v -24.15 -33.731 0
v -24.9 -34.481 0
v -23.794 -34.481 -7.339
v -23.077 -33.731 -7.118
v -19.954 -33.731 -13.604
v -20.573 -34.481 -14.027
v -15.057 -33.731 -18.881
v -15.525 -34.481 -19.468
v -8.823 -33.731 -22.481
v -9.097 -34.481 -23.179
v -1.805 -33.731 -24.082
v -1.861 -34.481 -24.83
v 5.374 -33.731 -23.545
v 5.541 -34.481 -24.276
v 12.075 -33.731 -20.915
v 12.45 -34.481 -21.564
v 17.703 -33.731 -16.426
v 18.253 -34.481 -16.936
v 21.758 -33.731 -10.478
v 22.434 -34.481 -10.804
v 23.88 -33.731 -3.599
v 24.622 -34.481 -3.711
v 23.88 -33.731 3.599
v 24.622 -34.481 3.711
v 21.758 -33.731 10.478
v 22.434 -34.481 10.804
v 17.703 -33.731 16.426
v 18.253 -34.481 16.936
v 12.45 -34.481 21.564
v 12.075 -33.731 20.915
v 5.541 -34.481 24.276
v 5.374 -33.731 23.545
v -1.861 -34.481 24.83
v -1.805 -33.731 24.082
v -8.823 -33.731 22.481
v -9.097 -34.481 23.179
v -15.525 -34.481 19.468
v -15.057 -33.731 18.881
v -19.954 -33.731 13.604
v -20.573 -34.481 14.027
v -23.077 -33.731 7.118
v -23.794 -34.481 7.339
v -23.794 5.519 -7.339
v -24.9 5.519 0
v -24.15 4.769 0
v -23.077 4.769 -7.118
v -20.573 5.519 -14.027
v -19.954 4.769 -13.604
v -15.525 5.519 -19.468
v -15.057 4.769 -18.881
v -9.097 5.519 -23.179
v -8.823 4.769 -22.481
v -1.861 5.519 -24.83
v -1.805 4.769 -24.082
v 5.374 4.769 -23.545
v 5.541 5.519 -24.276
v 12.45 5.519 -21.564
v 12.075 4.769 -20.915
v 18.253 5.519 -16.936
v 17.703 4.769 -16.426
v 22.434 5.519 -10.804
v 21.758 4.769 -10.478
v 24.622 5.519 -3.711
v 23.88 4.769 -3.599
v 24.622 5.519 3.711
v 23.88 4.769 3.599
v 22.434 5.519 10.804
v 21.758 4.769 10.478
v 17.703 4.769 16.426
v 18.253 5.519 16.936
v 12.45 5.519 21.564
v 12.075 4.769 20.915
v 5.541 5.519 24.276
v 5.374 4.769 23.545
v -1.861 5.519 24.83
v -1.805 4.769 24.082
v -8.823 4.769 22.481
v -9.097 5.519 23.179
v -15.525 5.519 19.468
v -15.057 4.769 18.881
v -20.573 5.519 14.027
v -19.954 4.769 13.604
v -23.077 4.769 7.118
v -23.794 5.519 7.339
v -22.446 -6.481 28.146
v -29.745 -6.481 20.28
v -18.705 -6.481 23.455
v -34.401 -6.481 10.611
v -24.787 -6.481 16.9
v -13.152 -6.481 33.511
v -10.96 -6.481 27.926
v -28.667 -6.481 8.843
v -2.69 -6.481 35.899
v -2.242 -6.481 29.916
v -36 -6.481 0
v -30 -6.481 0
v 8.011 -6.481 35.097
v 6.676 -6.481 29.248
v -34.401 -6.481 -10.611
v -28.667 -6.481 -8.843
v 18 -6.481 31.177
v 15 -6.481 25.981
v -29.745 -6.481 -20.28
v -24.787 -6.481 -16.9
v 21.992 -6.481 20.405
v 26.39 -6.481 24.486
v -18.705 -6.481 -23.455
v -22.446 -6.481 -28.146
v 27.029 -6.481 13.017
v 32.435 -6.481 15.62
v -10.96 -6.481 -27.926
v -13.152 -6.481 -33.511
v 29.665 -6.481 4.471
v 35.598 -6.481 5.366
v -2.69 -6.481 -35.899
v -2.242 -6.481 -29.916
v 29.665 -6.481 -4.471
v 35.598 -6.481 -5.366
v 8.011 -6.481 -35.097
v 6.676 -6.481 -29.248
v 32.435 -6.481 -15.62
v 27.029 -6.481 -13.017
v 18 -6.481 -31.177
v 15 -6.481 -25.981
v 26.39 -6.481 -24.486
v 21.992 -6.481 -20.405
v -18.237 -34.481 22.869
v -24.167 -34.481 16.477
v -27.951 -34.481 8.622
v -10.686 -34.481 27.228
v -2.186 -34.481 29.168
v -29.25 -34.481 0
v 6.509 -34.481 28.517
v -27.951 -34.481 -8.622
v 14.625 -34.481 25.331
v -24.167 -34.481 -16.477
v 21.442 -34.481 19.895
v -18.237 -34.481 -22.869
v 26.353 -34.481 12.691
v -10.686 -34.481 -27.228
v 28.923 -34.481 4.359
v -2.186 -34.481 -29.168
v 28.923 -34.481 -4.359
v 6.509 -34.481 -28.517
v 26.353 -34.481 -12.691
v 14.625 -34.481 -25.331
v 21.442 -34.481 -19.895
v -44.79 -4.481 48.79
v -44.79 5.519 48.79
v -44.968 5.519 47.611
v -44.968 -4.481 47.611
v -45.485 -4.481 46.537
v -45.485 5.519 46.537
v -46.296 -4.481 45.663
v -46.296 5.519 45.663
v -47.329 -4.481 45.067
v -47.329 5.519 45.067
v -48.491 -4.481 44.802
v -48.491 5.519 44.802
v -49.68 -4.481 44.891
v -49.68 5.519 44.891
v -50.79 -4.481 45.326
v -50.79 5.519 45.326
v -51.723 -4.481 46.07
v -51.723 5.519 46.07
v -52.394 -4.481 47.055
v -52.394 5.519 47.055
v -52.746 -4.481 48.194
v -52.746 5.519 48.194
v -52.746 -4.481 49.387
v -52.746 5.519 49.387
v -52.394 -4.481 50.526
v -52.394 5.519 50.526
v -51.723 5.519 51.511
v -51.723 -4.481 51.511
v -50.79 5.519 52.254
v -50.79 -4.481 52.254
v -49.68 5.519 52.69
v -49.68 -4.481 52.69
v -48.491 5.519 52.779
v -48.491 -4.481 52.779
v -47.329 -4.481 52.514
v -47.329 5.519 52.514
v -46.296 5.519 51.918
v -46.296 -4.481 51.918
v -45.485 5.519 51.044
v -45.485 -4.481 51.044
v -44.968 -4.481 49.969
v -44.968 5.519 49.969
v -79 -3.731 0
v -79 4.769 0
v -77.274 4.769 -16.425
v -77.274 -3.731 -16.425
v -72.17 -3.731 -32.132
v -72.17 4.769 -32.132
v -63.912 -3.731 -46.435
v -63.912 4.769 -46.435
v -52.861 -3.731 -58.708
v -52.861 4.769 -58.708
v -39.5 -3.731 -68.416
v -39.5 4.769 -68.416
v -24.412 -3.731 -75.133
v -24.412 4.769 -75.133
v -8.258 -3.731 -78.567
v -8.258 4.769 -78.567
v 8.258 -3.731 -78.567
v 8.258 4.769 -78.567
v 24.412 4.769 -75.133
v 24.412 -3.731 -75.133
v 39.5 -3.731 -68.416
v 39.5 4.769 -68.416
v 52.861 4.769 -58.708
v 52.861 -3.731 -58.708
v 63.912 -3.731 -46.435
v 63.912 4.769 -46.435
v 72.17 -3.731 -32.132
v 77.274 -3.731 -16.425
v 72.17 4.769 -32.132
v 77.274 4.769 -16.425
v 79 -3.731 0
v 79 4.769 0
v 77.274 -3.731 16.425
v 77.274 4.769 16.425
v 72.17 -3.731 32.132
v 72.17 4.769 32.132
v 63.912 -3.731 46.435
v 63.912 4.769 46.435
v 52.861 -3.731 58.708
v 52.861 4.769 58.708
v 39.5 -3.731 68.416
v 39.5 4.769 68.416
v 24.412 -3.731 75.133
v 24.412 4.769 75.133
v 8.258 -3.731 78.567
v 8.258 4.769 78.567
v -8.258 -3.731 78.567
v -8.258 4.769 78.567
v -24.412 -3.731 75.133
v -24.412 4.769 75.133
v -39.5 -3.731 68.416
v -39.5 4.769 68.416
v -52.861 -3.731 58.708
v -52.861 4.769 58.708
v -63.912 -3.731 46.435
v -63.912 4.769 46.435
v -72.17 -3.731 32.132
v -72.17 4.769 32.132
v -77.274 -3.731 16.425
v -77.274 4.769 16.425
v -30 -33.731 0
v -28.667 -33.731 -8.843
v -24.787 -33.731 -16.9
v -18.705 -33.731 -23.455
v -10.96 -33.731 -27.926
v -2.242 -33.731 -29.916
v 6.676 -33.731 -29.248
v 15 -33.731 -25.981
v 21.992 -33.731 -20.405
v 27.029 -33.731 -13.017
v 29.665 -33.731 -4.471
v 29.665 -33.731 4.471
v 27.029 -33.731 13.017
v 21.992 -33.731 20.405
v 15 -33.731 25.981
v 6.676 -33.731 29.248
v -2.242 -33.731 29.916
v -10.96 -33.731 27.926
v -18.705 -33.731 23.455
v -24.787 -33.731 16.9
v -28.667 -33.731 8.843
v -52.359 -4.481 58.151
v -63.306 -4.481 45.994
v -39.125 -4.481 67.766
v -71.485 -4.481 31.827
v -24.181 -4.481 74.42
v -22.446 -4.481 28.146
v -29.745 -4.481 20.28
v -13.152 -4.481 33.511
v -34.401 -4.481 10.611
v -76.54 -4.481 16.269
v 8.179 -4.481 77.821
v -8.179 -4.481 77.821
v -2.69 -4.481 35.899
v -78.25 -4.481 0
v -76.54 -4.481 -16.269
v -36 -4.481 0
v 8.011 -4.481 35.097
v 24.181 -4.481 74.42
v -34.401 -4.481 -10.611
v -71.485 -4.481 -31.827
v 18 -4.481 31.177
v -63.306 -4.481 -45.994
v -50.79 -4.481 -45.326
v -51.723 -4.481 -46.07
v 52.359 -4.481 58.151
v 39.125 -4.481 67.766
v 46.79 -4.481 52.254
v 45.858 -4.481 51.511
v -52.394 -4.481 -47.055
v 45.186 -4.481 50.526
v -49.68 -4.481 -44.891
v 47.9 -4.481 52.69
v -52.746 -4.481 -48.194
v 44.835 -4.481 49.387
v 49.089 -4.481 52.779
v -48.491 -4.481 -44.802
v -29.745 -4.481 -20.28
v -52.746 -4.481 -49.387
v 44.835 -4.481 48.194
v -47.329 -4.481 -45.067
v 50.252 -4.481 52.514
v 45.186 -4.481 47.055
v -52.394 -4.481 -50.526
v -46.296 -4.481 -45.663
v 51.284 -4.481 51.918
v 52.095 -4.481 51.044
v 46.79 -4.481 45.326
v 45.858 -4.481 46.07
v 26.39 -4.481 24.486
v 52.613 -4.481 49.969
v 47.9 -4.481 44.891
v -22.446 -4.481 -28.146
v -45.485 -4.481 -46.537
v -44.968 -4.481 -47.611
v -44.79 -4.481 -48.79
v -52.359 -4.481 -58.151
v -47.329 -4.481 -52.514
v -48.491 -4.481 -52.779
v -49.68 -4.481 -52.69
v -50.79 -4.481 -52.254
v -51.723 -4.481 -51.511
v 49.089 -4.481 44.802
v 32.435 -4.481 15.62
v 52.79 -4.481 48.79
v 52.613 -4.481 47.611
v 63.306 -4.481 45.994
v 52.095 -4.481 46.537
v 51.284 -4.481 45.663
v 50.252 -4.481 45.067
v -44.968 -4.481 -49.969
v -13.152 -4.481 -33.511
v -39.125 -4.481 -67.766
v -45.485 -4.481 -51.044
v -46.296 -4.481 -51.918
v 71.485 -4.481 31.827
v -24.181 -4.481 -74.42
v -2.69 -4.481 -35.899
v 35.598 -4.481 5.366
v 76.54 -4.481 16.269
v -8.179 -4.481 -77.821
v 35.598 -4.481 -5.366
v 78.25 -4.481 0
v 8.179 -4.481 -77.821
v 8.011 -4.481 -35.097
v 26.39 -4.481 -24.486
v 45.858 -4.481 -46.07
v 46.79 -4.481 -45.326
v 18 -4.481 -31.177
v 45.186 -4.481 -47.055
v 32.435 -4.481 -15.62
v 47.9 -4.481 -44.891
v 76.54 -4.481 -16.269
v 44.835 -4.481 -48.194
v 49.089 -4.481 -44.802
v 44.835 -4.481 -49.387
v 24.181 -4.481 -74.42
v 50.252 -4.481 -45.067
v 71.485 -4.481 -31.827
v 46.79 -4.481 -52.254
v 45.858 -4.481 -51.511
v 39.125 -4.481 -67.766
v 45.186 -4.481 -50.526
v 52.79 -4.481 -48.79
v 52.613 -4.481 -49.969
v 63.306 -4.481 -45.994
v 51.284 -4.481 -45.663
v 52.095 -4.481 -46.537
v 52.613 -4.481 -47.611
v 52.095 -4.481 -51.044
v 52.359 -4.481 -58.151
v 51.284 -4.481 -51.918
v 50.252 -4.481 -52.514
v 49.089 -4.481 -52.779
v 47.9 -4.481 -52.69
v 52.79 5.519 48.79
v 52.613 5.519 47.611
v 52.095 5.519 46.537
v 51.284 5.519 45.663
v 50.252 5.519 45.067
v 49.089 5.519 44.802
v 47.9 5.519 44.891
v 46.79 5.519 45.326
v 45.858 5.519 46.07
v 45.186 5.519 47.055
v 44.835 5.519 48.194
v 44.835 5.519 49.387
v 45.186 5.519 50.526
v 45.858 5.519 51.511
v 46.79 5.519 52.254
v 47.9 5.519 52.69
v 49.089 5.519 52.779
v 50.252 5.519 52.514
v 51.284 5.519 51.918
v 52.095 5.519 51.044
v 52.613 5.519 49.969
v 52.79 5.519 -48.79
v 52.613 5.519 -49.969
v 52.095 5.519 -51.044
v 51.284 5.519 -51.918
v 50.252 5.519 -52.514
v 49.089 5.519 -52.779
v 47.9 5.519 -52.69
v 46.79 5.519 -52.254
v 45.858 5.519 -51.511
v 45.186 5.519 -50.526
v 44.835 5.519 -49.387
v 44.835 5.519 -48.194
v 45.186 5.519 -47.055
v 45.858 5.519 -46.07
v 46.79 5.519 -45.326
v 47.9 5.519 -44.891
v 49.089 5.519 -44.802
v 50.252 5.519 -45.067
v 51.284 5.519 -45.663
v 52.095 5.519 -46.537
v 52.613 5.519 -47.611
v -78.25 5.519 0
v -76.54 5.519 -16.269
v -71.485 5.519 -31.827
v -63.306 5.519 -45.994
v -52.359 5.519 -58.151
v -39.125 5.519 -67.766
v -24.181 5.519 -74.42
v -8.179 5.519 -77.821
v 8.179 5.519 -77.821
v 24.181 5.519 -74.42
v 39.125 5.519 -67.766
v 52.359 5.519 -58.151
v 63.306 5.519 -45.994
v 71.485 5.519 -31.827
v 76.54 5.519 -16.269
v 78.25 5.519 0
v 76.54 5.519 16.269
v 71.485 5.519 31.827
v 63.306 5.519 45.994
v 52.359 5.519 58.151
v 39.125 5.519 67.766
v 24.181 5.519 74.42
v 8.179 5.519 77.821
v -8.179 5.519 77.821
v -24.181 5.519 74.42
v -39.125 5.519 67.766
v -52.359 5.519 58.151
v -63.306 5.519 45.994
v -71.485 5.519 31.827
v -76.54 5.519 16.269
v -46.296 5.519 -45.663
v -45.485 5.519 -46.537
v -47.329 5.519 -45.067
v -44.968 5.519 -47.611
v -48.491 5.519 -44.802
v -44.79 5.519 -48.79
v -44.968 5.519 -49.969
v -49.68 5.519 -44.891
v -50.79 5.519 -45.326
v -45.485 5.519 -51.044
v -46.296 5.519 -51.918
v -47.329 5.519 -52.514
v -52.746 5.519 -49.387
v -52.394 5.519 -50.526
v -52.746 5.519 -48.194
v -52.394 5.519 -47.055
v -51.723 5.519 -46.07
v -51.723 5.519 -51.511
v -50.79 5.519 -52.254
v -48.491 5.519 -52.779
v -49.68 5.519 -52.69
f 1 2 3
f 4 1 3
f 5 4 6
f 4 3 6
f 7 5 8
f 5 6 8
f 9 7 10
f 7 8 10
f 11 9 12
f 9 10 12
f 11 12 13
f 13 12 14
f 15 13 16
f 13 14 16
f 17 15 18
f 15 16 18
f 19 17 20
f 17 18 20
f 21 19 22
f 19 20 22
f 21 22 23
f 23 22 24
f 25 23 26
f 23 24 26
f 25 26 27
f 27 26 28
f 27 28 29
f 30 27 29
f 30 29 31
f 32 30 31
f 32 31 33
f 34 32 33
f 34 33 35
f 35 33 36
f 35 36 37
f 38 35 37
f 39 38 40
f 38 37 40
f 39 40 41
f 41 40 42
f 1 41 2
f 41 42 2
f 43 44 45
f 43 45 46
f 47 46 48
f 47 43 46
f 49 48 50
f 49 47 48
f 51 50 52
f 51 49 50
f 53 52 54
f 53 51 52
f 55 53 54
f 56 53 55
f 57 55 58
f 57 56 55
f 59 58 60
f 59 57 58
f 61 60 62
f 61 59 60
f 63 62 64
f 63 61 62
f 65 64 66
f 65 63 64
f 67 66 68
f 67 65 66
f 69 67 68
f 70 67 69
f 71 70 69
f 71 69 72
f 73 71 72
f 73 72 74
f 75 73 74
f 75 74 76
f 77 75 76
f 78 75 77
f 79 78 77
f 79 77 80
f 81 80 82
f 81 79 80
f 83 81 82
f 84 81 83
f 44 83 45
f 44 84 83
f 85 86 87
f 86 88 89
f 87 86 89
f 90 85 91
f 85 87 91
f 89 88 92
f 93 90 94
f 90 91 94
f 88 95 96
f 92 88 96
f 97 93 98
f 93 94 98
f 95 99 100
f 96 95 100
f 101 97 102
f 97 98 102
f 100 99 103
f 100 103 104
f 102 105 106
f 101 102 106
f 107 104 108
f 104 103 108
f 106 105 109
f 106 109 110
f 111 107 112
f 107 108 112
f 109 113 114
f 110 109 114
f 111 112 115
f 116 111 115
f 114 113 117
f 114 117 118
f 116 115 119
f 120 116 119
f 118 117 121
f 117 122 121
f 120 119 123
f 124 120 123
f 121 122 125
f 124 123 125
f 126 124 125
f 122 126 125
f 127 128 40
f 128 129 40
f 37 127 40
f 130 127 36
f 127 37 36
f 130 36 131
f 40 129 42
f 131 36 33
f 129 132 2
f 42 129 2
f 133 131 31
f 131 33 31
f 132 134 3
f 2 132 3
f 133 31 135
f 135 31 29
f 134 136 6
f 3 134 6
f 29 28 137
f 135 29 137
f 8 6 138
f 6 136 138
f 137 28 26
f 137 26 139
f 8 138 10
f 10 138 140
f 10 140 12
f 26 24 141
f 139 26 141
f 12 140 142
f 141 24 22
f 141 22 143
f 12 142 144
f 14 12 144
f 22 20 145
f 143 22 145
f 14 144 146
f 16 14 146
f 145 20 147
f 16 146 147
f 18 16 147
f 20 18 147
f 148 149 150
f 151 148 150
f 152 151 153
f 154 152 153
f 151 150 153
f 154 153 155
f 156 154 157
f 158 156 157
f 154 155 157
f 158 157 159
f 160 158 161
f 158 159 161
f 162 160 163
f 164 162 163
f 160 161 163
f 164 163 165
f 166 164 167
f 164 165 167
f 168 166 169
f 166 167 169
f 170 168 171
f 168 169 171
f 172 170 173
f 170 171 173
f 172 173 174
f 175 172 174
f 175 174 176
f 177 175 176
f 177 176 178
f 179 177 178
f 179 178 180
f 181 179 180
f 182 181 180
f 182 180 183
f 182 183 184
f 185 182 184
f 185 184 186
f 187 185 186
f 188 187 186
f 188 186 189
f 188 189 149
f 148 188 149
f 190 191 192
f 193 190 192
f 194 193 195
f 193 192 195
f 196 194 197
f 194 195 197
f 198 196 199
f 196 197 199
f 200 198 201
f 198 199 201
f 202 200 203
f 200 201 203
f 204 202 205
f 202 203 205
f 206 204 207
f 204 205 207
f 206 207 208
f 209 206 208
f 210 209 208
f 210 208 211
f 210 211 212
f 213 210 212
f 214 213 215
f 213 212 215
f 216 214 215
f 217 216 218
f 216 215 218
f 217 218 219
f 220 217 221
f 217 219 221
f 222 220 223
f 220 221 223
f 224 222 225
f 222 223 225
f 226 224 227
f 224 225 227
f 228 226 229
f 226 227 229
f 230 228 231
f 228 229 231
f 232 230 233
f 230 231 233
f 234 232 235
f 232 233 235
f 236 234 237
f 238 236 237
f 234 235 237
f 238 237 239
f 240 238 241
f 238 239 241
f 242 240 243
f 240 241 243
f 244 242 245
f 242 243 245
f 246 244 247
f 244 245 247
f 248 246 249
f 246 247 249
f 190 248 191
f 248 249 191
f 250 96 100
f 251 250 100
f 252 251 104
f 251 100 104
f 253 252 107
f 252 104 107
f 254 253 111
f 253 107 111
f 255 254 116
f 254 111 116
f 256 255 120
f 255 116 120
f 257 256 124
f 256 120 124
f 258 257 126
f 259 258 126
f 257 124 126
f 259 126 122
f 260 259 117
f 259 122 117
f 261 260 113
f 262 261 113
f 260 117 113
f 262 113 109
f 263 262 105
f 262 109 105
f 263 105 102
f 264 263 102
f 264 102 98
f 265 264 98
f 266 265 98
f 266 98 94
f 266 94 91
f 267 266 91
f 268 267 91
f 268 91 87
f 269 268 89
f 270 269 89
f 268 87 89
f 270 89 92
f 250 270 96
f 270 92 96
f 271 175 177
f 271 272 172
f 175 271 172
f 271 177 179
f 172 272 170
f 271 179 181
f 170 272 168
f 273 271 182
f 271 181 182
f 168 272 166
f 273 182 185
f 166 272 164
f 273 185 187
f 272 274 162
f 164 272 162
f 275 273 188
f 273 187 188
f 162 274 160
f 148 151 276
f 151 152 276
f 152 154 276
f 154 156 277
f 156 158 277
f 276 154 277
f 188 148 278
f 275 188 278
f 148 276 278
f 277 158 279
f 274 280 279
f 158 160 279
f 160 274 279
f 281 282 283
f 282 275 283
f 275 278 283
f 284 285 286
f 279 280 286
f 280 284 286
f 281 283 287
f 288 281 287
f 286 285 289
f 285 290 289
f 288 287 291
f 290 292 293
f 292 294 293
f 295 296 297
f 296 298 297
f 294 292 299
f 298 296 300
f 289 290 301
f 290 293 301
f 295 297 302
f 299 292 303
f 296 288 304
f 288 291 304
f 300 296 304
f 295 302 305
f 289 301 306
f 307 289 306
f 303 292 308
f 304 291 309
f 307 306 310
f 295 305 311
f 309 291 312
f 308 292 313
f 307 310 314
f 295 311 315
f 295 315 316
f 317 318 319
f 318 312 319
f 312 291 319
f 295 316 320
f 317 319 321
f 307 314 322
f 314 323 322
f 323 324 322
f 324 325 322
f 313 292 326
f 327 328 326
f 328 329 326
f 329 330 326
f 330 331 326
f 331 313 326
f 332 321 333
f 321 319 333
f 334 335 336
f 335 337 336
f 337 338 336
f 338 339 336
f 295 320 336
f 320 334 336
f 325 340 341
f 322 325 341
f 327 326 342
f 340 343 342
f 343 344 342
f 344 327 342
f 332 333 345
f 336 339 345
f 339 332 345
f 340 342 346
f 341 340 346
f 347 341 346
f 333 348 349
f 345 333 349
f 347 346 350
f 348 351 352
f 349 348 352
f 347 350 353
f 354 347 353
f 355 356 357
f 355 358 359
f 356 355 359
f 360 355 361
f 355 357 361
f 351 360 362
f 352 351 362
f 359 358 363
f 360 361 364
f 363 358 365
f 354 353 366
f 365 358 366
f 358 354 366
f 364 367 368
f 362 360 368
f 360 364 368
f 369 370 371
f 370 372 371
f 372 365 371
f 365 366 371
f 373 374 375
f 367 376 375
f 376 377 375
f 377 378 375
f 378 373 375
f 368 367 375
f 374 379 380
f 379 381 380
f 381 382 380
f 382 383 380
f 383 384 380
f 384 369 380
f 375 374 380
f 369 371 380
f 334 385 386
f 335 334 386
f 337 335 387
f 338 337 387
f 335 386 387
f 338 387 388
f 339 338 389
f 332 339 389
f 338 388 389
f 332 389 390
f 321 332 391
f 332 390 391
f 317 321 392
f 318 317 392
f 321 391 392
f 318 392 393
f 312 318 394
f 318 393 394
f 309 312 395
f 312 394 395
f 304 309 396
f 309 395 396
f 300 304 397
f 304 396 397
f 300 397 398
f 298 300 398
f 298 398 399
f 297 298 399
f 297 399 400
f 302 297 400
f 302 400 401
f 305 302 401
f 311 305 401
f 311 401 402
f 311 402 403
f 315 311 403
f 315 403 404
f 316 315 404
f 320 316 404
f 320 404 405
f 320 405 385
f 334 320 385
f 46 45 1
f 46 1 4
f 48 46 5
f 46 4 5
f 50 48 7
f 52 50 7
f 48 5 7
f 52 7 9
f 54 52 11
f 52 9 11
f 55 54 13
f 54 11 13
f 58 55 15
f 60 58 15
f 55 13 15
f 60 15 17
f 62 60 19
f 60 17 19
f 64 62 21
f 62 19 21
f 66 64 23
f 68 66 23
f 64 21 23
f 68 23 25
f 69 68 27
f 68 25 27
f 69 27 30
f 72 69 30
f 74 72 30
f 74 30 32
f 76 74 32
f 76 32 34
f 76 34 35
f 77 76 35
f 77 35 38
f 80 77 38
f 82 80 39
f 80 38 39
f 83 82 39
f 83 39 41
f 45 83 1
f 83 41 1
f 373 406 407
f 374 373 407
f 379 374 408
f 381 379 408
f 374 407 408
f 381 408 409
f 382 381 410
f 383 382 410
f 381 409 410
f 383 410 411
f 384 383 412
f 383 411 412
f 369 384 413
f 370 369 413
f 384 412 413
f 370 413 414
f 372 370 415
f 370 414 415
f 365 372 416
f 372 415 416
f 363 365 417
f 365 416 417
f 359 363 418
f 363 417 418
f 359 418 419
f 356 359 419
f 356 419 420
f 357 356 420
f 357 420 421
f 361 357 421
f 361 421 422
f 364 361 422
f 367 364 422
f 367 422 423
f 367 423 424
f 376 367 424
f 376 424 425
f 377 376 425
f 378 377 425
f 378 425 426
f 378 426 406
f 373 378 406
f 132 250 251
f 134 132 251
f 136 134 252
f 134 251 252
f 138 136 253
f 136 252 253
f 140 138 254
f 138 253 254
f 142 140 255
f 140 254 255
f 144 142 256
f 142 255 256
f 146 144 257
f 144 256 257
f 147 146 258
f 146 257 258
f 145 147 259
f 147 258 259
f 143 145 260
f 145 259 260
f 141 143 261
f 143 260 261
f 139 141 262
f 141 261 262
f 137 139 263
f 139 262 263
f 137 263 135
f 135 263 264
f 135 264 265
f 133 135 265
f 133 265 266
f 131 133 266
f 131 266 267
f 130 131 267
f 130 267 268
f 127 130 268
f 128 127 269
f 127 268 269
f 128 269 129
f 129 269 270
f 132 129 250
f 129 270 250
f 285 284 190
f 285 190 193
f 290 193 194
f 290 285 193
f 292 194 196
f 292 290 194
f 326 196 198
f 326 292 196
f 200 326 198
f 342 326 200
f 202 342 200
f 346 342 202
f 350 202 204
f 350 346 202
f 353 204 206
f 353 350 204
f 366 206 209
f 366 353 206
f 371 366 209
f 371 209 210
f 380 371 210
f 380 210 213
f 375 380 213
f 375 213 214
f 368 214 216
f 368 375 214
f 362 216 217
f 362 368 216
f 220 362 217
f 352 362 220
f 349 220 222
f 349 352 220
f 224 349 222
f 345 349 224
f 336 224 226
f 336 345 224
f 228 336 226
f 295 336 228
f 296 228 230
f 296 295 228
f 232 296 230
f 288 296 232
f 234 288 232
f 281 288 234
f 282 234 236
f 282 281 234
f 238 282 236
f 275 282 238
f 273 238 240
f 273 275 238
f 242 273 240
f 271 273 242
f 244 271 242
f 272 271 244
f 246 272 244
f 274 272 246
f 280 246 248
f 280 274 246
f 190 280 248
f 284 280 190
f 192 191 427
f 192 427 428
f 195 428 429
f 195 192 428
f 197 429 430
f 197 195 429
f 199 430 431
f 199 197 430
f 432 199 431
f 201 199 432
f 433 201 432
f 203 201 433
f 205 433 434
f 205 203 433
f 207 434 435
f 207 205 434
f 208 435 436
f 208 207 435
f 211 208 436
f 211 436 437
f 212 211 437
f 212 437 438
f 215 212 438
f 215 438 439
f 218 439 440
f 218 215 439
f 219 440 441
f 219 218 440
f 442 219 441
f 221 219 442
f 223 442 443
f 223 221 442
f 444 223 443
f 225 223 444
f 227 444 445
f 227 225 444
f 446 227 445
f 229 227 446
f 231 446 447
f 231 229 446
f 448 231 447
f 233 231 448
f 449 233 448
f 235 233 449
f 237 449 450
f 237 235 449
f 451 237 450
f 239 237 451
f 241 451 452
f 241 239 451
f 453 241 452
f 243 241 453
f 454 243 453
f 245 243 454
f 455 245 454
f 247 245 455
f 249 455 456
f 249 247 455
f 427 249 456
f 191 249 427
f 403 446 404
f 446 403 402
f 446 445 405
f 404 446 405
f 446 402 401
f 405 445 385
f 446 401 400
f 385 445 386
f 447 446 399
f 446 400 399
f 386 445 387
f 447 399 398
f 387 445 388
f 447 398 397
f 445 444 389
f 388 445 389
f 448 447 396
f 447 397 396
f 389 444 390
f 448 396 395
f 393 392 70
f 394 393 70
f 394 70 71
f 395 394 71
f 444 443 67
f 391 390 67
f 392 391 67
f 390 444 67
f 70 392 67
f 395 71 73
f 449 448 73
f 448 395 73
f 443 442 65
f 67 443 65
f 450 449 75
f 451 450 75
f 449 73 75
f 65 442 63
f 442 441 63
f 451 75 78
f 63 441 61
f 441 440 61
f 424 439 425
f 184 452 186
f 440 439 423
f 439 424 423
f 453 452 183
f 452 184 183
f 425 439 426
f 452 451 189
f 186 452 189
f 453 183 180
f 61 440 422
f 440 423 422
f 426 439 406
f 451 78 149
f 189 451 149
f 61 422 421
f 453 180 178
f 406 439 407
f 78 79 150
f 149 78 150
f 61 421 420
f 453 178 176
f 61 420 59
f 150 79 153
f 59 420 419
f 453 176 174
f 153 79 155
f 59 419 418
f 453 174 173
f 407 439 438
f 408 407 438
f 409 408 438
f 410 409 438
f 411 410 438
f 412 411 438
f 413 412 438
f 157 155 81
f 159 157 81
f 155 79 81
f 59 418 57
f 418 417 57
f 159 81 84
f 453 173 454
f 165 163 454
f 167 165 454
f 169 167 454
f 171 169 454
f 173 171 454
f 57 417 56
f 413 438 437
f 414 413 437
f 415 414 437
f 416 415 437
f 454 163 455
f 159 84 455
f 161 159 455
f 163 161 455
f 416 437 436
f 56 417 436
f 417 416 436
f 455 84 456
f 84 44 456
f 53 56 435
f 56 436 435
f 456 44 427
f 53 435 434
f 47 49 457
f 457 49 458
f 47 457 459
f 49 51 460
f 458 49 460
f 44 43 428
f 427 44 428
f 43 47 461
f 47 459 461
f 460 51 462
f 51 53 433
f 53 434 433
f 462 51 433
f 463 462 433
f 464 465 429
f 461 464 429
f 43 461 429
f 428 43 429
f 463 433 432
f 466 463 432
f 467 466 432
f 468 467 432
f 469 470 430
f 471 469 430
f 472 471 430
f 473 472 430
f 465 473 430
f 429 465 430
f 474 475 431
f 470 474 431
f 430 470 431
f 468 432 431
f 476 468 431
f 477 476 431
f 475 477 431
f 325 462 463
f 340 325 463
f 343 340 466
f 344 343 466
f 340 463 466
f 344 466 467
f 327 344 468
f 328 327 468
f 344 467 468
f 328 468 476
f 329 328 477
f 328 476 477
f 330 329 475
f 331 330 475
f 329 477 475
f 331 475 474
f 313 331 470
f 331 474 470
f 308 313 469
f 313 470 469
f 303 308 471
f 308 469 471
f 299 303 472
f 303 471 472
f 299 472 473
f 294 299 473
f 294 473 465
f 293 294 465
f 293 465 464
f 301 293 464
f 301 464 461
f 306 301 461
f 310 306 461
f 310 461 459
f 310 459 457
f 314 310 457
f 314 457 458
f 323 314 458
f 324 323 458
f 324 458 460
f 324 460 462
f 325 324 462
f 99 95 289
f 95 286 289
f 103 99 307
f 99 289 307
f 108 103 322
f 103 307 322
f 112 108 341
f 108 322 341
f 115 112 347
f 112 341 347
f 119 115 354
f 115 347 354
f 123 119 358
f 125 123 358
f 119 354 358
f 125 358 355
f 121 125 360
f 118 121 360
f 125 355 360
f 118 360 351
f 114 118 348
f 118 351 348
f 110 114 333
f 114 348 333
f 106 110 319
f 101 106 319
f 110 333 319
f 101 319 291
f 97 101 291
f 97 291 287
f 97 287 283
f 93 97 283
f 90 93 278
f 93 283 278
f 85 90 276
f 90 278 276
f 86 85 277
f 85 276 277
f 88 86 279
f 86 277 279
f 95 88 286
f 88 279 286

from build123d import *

# Parameters (mm, degrees)
CUT_EXTRUDE1_REACH = 42
SKETCH2_R          = 4
CHAMFER1_SIZE      = 0.75


with BuildPart() as part:
    # Sketch1 → Revolve1 (revolve)
    with BuildSketch(Plane.XY):
        Polygon((-24.15, 5.519256014), (-24.15, -34.480743986), (-30, -34.480743986), (-30, -6.480743986), (-36, -6.480743986), (-36, -4.480743986), (-79, -4.480743986), (-79, 5.519256014), align=None)
    revolve(axis=Axis((0, 0, 0), (0, -1, 0)))

    # Sketch2 → Cut-Extrude1 (cut, up to next)
    with BuildSketch(Plane(origin=(0, 5.519256014, 0), x_dir=(1, 0, 0), z_dir=(0, 1, 0)), mode=Mode.PRIVATE) as cut_extrude1_sk1:
        with Locations((48.790367902, 48.790367902)):
            Circle(SKETCH2_R)
    cut_extrude1_tool1 = extrude(cut_extrude1_sk1.sketch, amount=-CUT_EXTRUDE1_REACH, mode=Mode.PRIVATE) & part.part
    add(cut_extrude1_tool1.solids().sort_by_distance((48.790368, 5.519256, -48.790368))[0], mode=Mode.SUBTRACT)
    # Sketch2 → Cut-Extrude1 (cut, up to next)
    with BuildSketch(Plane(origin=(0, 5.519256014, 0), x_dir=(1, 0, 0), z_dir=(0, 1, 0)), mode=Mode.PRIVATE) as cut_extrude1_sk2:
        with Locations((48.790367902, -48.790367902)):
            Circle(SKETCH2_R)
    cut_extrude1_tool2 = extrude(cut_extrude1_sk2.sketch, amount=-CUT_EXTRUDE1_REACH, mode=Mode.PRIVATE) & part.part
    add(cut_extrude1_tool2.solids().sort_by_distance((48.790368, 5.519256, 48.790368))[0], mode=Mode.SUBTRACT)
    # Sketch2 → Cut-Extrude1 (cut, up to next)
    with BuildSketch(Plane(origin=(0, 5.519256014, 0), x_dir=(1, 0, 0), z_dir=(0, 1, 0)), mode=Mode.PRIVATE) as cut_extrude1_sk3:
        with Locations((-48.790367902, -48.790367902)):
            Circle(SKETCH2_R)
    cut_extrude1_tool3 = extrude(cut_extrude1_sk3.sketch, amount=-CUT_EXTRUDE1_REACH, mode=Mode.PRIVATE) & part.part
    add(cut_extrude1_tool3.solids().sort_by_distance((-48.790368, 5.519256, 48.790368))[0], mode=Mode.SUBTRACT)
    # Sketch2 → Cut-Extrude1 (cut, up to next)
    with BuildSketch(Plane(origin=(0, 5.519256014, 0), x_dir=(1, 0, 0), z_dir=(0, 1, 0)), mode=Mode.PRIVATE) as cut_extrude1_sk4:
        with Locations((-48.790367902, 48.790367902)):
            Circle(SKETCH2_R)
    cut_extrude1_tool4 = extrude(cut_extrude1_sk4.sketch, amount=-CUT_EXTRUDE1_REACH, mode=Mode.PRIVATE) & part.part
    add(cut_extrude1_tool4.solids().sort_by_distance((-48.790368, 5.519256, -48.790368))[0], mode=Mode.SUBTRACT)

    # Chamfer1
    chamfer1_edges = [part.edges().sort_by_distance(p)[0] for p in [
        (79, 5.519256014, 0),
        (79, -4.480743986, 0),
        (30, -34.480743986, 0),
        (24.15, -34.480743986, 0),
        (24.15, 5.519256014, 0),
    ]]
    chamfer(chamfer1_edges, length=CHAMFER1_SIZE)


solid = part.part
